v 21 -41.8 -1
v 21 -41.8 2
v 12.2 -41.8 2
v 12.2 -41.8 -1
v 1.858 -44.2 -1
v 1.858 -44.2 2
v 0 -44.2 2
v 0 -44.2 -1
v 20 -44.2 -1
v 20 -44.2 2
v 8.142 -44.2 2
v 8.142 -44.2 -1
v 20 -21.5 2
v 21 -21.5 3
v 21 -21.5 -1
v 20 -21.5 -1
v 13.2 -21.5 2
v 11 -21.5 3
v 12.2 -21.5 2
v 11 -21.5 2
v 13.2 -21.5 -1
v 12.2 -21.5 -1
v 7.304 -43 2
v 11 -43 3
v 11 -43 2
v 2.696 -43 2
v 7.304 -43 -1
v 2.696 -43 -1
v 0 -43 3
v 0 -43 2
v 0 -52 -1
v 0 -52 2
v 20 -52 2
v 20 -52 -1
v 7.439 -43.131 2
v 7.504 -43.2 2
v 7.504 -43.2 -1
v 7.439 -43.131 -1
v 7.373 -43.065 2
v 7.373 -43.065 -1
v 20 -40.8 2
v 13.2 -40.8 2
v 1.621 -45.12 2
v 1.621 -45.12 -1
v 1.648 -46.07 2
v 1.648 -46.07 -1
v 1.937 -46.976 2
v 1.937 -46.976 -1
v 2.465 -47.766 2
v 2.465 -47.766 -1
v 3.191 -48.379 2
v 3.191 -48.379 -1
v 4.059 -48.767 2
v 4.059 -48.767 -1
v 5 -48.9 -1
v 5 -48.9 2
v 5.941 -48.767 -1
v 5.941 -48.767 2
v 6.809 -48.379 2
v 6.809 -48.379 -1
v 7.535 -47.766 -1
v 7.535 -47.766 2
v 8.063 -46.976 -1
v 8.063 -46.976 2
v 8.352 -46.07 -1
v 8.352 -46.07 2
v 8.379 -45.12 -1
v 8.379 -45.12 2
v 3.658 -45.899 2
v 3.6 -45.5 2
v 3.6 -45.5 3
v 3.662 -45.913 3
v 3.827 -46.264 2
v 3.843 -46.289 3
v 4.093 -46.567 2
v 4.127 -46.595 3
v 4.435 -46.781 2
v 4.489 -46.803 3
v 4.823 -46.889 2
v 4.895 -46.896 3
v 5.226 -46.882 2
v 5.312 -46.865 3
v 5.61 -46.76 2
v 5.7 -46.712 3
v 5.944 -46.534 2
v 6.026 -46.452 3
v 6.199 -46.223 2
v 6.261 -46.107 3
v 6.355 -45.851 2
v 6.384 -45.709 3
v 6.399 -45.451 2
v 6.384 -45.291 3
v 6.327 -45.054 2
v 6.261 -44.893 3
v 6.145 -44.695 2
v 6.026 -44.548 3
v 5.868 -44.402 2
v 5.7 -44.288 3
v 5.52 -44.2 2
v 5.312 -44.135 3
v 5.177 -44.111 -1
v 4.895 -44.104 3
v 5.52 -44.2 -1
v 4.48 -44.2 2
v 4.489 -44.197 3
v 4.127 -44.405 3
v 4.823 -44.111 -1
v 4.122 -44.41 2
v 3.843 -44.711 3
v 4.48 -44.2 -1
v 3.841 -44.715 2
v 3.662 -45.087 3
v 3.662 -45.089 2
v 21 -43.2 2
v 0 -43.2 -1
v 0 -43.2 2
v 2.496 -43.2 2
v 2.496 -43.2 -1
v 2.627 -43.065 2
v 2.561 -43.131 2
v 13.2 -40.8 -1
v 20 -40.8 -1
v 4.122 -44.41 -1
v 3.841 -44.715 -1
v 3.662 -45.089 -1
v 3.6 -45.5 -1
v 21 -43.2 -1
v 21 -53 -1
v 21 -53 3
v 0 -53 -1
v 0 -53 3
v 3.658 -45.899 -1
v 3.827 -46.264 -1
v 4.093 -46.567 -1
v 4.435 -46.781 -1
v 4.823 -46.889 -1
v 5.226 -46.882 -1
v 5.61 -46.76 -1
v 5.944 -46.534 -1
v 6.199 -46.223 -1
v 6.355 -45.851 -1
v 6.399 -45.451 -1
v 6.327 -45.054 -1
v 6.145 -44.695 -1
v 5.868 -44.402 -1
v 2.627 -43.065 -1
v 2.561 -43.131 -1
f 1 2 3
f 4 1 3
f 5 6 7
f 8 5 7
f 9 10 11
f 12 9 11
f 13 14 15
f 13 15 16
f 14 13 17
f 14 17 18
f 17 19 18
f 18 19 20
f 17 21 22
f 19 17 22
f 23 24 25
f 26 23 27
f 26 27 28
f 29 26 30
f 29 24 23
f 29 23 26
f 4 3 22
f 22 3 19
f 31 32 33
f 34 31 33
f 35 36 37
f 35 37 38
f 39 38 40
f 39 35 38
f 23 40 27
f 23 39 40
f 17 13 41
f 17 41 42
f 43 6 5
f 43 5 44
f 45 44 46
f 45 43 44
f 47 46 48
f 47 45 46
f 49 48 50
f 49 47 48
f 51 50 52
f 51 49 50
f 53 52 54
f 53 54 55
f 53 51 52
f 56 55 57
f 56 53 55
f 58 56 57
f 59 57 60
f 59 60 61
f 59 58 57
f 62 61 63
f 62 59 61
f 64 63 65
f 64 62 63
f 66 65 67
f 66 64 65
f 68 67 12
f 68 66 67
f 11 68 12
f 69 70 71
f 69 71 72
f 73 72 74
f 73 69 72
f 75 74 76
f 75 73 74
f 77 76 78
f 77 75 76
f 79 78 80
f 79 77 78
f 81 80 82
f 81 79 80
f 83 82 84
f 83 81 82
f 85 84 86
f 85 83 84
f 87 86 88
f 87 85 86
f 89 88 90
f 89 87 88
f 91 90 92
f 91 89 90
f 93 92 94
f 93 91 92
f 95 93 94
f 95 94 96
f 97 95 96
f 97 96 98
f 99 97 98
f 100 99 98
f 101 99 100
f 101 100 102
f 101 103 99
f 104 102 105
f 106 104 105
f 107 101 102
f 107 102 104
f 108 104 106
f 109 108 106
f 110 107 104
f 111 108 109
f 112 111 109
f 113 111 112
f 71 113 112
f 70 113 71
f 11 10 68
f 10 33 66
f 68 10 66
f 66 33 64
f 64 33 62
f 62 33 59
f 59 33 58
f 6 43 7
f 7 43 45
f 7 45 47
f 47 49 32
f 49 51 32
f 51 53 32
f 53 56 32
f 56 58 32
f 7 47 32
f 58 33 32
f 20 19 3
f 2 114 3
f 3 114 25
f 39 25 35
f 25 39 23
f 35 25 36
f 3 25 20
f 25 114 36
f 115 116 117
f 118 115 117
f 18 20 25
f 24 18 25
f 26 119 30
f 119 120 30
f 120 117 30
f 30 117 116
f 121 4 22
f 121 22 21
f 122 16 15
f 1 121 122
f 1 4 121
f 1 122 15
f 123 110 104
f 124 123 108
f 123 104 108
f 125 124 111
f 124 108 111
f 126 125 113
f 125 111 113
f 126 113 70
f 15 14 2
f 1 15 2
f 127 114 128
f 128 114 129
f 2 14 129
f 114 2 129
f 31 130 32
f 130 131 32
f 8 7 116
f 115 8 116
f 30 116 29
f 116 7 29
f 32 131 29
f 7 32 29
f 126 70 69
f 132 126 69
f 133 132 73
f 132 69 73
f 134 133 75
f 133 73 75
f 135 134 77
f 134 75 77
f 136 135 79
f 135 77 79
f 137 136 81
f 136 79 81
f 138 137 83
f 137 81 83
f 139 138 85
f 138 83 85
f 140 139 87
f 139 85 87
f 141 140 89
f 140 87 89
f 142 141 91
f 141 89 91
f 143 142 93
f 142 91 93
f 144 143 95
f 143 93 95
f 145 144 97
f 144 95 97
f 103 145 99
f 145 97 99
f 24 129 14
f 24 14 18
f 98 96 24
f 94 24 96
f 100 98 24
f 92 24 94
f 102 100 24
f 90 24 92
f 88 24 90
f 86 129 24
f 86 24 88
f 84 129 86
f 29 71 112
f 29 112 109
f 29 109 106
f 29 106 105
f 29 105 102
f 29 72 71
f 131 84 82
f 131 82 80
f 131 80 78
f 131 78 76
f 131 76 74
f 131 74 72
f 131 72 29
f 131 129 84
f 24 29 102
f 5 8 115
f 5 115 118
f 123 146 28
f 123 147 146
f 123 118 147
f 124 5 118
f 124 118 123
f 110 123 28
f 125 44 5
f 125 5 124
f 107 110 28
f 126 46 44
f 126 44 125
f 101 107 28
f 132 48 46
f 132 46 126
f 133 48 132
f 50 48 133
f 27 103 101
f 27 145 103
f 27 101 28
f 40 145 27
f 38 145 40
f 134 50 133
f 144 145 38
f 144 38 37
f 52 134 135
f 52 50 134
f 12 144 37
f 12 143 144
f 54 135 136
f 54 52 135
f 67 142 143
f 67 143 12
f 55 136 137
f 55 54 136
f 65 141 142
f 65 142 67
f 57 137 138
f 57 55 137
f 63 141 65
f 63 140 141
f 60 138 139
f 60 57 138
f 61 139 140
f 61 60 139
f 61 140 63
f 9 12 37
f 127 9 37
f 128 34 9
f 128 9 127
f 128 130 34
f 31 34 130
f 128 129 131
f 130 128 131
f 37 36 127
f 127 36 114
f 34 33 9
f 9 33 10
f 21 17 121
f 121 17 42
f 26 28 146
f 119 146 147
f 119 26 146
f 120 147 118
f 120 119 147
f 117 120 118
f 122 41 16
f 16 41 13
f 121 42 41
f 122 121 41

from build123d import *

# Parameters (mm, degrees)
CYLINDER005_R     = 1.4
CYLINDER005_DEPTH = 10
EXTRUDE001_DEPTH  = 3
SKETCH002_R       = 1.4
EXTRUDE002_DEPTH  = 4
EXTRUDE_DEPTH     = 1


with BuildPart() as cylinder005:
    # Cylinder005 → Cylinder005 (new body)
    with BuildSketch(Plane(origin=(-5, 2.5, -5), x_dir=(1, 0, 0), z_dir=(0, 0, 1))):
        Circle(CYLINDER005_R)
    extrude(amount=CYLINDER005_DEPTH)


with BuildPart() as extrude001:
    # Sketch001 → Extrude001 (new body)
    with BuildSketch(Plane.XY.offset(10)):
        Polygon((-21, 10), (0, 10), (0, 9), (-20, 9), (-20, 1.2), (0, 1.2), (0, 0.2), (-21, 0.2), align=None)
        Polygon((-21, -1.2), (-12.2, -1.2), (-12.2, -21.5), (-13.2, -21.5), (-13.2, -2.2), (-20, -2.2), (-20, -21.5), (-21, -21.5), align=None)
    extrude(amount=-EXTRUDE001_DEPTH)


with BuildPart() as extrude001_1:
    # Extrude001 placement: moved
    add(extrude001.part.moved(Location((0, 0, -8))))


with BuildPart() as extrude002:
    # Sketch002 → Extrude002 (new body)
    with BuildSketch(Plane.XY.offset(10)):
        with BuildLine():
            ThreePointArc((-2.695656, 0), (-5, 5.9), (-7.304344, 0))
            Line((-7.304344, 0), (-2.695656, 0))
        make_face()
        with Locations((-5, 2.5)):
            Circle(SKETCH002_R, mode=Mode.SUBTRACT)
    extrude(amount=-EXTRUDE002_DEPTH)


with BuildPart() as extrude002_1:
    # Extrude002 placement: moved
    add(extrude002.part.moved(Location((0, 0, -7))))


with BuildPart() as body001:
    # Sketch → Extrude (new body)
    with BuildSketch(Plane.XY):
        Polygon((-11, 0), (0, 0), (0, 10), (-21, 10), (-21, -21.5), (-11, -21.5), align=None)
    extrude(amount=EXTRUDE_DEPTH)


with BuildPart() as body001_1:
    # Extrude placement: moved
    add(body001.part.moved(Location((0, 0, 2))))

    # Fusion012: union Extrude001, Extrude002
    add(extrude001_1.part)
    add(extrude002_1.part)

    # Cut001: cut Cylinder005
    add(cylinder005.part, mode=Mode.SUBTRACT)


with BuildPart() as body003:
    # Part__Mirroring002: instance of Body001
    add(body001_1.part.mirror(Plane(origin=(0, -21.5, 0), x_dir=(1, 0, 0), z_dir=(0, 1, 0))))


with BuildPart() as part_mirroring004:
    # Part__Mirroring004: instance of Body003
    add(body003.part.mirror(Plane(origin=(0, -21.5, 0), x_dir=(0, -1, 0), z_dir=(1, 0, 0))))


solid = part_mirroring004.part
